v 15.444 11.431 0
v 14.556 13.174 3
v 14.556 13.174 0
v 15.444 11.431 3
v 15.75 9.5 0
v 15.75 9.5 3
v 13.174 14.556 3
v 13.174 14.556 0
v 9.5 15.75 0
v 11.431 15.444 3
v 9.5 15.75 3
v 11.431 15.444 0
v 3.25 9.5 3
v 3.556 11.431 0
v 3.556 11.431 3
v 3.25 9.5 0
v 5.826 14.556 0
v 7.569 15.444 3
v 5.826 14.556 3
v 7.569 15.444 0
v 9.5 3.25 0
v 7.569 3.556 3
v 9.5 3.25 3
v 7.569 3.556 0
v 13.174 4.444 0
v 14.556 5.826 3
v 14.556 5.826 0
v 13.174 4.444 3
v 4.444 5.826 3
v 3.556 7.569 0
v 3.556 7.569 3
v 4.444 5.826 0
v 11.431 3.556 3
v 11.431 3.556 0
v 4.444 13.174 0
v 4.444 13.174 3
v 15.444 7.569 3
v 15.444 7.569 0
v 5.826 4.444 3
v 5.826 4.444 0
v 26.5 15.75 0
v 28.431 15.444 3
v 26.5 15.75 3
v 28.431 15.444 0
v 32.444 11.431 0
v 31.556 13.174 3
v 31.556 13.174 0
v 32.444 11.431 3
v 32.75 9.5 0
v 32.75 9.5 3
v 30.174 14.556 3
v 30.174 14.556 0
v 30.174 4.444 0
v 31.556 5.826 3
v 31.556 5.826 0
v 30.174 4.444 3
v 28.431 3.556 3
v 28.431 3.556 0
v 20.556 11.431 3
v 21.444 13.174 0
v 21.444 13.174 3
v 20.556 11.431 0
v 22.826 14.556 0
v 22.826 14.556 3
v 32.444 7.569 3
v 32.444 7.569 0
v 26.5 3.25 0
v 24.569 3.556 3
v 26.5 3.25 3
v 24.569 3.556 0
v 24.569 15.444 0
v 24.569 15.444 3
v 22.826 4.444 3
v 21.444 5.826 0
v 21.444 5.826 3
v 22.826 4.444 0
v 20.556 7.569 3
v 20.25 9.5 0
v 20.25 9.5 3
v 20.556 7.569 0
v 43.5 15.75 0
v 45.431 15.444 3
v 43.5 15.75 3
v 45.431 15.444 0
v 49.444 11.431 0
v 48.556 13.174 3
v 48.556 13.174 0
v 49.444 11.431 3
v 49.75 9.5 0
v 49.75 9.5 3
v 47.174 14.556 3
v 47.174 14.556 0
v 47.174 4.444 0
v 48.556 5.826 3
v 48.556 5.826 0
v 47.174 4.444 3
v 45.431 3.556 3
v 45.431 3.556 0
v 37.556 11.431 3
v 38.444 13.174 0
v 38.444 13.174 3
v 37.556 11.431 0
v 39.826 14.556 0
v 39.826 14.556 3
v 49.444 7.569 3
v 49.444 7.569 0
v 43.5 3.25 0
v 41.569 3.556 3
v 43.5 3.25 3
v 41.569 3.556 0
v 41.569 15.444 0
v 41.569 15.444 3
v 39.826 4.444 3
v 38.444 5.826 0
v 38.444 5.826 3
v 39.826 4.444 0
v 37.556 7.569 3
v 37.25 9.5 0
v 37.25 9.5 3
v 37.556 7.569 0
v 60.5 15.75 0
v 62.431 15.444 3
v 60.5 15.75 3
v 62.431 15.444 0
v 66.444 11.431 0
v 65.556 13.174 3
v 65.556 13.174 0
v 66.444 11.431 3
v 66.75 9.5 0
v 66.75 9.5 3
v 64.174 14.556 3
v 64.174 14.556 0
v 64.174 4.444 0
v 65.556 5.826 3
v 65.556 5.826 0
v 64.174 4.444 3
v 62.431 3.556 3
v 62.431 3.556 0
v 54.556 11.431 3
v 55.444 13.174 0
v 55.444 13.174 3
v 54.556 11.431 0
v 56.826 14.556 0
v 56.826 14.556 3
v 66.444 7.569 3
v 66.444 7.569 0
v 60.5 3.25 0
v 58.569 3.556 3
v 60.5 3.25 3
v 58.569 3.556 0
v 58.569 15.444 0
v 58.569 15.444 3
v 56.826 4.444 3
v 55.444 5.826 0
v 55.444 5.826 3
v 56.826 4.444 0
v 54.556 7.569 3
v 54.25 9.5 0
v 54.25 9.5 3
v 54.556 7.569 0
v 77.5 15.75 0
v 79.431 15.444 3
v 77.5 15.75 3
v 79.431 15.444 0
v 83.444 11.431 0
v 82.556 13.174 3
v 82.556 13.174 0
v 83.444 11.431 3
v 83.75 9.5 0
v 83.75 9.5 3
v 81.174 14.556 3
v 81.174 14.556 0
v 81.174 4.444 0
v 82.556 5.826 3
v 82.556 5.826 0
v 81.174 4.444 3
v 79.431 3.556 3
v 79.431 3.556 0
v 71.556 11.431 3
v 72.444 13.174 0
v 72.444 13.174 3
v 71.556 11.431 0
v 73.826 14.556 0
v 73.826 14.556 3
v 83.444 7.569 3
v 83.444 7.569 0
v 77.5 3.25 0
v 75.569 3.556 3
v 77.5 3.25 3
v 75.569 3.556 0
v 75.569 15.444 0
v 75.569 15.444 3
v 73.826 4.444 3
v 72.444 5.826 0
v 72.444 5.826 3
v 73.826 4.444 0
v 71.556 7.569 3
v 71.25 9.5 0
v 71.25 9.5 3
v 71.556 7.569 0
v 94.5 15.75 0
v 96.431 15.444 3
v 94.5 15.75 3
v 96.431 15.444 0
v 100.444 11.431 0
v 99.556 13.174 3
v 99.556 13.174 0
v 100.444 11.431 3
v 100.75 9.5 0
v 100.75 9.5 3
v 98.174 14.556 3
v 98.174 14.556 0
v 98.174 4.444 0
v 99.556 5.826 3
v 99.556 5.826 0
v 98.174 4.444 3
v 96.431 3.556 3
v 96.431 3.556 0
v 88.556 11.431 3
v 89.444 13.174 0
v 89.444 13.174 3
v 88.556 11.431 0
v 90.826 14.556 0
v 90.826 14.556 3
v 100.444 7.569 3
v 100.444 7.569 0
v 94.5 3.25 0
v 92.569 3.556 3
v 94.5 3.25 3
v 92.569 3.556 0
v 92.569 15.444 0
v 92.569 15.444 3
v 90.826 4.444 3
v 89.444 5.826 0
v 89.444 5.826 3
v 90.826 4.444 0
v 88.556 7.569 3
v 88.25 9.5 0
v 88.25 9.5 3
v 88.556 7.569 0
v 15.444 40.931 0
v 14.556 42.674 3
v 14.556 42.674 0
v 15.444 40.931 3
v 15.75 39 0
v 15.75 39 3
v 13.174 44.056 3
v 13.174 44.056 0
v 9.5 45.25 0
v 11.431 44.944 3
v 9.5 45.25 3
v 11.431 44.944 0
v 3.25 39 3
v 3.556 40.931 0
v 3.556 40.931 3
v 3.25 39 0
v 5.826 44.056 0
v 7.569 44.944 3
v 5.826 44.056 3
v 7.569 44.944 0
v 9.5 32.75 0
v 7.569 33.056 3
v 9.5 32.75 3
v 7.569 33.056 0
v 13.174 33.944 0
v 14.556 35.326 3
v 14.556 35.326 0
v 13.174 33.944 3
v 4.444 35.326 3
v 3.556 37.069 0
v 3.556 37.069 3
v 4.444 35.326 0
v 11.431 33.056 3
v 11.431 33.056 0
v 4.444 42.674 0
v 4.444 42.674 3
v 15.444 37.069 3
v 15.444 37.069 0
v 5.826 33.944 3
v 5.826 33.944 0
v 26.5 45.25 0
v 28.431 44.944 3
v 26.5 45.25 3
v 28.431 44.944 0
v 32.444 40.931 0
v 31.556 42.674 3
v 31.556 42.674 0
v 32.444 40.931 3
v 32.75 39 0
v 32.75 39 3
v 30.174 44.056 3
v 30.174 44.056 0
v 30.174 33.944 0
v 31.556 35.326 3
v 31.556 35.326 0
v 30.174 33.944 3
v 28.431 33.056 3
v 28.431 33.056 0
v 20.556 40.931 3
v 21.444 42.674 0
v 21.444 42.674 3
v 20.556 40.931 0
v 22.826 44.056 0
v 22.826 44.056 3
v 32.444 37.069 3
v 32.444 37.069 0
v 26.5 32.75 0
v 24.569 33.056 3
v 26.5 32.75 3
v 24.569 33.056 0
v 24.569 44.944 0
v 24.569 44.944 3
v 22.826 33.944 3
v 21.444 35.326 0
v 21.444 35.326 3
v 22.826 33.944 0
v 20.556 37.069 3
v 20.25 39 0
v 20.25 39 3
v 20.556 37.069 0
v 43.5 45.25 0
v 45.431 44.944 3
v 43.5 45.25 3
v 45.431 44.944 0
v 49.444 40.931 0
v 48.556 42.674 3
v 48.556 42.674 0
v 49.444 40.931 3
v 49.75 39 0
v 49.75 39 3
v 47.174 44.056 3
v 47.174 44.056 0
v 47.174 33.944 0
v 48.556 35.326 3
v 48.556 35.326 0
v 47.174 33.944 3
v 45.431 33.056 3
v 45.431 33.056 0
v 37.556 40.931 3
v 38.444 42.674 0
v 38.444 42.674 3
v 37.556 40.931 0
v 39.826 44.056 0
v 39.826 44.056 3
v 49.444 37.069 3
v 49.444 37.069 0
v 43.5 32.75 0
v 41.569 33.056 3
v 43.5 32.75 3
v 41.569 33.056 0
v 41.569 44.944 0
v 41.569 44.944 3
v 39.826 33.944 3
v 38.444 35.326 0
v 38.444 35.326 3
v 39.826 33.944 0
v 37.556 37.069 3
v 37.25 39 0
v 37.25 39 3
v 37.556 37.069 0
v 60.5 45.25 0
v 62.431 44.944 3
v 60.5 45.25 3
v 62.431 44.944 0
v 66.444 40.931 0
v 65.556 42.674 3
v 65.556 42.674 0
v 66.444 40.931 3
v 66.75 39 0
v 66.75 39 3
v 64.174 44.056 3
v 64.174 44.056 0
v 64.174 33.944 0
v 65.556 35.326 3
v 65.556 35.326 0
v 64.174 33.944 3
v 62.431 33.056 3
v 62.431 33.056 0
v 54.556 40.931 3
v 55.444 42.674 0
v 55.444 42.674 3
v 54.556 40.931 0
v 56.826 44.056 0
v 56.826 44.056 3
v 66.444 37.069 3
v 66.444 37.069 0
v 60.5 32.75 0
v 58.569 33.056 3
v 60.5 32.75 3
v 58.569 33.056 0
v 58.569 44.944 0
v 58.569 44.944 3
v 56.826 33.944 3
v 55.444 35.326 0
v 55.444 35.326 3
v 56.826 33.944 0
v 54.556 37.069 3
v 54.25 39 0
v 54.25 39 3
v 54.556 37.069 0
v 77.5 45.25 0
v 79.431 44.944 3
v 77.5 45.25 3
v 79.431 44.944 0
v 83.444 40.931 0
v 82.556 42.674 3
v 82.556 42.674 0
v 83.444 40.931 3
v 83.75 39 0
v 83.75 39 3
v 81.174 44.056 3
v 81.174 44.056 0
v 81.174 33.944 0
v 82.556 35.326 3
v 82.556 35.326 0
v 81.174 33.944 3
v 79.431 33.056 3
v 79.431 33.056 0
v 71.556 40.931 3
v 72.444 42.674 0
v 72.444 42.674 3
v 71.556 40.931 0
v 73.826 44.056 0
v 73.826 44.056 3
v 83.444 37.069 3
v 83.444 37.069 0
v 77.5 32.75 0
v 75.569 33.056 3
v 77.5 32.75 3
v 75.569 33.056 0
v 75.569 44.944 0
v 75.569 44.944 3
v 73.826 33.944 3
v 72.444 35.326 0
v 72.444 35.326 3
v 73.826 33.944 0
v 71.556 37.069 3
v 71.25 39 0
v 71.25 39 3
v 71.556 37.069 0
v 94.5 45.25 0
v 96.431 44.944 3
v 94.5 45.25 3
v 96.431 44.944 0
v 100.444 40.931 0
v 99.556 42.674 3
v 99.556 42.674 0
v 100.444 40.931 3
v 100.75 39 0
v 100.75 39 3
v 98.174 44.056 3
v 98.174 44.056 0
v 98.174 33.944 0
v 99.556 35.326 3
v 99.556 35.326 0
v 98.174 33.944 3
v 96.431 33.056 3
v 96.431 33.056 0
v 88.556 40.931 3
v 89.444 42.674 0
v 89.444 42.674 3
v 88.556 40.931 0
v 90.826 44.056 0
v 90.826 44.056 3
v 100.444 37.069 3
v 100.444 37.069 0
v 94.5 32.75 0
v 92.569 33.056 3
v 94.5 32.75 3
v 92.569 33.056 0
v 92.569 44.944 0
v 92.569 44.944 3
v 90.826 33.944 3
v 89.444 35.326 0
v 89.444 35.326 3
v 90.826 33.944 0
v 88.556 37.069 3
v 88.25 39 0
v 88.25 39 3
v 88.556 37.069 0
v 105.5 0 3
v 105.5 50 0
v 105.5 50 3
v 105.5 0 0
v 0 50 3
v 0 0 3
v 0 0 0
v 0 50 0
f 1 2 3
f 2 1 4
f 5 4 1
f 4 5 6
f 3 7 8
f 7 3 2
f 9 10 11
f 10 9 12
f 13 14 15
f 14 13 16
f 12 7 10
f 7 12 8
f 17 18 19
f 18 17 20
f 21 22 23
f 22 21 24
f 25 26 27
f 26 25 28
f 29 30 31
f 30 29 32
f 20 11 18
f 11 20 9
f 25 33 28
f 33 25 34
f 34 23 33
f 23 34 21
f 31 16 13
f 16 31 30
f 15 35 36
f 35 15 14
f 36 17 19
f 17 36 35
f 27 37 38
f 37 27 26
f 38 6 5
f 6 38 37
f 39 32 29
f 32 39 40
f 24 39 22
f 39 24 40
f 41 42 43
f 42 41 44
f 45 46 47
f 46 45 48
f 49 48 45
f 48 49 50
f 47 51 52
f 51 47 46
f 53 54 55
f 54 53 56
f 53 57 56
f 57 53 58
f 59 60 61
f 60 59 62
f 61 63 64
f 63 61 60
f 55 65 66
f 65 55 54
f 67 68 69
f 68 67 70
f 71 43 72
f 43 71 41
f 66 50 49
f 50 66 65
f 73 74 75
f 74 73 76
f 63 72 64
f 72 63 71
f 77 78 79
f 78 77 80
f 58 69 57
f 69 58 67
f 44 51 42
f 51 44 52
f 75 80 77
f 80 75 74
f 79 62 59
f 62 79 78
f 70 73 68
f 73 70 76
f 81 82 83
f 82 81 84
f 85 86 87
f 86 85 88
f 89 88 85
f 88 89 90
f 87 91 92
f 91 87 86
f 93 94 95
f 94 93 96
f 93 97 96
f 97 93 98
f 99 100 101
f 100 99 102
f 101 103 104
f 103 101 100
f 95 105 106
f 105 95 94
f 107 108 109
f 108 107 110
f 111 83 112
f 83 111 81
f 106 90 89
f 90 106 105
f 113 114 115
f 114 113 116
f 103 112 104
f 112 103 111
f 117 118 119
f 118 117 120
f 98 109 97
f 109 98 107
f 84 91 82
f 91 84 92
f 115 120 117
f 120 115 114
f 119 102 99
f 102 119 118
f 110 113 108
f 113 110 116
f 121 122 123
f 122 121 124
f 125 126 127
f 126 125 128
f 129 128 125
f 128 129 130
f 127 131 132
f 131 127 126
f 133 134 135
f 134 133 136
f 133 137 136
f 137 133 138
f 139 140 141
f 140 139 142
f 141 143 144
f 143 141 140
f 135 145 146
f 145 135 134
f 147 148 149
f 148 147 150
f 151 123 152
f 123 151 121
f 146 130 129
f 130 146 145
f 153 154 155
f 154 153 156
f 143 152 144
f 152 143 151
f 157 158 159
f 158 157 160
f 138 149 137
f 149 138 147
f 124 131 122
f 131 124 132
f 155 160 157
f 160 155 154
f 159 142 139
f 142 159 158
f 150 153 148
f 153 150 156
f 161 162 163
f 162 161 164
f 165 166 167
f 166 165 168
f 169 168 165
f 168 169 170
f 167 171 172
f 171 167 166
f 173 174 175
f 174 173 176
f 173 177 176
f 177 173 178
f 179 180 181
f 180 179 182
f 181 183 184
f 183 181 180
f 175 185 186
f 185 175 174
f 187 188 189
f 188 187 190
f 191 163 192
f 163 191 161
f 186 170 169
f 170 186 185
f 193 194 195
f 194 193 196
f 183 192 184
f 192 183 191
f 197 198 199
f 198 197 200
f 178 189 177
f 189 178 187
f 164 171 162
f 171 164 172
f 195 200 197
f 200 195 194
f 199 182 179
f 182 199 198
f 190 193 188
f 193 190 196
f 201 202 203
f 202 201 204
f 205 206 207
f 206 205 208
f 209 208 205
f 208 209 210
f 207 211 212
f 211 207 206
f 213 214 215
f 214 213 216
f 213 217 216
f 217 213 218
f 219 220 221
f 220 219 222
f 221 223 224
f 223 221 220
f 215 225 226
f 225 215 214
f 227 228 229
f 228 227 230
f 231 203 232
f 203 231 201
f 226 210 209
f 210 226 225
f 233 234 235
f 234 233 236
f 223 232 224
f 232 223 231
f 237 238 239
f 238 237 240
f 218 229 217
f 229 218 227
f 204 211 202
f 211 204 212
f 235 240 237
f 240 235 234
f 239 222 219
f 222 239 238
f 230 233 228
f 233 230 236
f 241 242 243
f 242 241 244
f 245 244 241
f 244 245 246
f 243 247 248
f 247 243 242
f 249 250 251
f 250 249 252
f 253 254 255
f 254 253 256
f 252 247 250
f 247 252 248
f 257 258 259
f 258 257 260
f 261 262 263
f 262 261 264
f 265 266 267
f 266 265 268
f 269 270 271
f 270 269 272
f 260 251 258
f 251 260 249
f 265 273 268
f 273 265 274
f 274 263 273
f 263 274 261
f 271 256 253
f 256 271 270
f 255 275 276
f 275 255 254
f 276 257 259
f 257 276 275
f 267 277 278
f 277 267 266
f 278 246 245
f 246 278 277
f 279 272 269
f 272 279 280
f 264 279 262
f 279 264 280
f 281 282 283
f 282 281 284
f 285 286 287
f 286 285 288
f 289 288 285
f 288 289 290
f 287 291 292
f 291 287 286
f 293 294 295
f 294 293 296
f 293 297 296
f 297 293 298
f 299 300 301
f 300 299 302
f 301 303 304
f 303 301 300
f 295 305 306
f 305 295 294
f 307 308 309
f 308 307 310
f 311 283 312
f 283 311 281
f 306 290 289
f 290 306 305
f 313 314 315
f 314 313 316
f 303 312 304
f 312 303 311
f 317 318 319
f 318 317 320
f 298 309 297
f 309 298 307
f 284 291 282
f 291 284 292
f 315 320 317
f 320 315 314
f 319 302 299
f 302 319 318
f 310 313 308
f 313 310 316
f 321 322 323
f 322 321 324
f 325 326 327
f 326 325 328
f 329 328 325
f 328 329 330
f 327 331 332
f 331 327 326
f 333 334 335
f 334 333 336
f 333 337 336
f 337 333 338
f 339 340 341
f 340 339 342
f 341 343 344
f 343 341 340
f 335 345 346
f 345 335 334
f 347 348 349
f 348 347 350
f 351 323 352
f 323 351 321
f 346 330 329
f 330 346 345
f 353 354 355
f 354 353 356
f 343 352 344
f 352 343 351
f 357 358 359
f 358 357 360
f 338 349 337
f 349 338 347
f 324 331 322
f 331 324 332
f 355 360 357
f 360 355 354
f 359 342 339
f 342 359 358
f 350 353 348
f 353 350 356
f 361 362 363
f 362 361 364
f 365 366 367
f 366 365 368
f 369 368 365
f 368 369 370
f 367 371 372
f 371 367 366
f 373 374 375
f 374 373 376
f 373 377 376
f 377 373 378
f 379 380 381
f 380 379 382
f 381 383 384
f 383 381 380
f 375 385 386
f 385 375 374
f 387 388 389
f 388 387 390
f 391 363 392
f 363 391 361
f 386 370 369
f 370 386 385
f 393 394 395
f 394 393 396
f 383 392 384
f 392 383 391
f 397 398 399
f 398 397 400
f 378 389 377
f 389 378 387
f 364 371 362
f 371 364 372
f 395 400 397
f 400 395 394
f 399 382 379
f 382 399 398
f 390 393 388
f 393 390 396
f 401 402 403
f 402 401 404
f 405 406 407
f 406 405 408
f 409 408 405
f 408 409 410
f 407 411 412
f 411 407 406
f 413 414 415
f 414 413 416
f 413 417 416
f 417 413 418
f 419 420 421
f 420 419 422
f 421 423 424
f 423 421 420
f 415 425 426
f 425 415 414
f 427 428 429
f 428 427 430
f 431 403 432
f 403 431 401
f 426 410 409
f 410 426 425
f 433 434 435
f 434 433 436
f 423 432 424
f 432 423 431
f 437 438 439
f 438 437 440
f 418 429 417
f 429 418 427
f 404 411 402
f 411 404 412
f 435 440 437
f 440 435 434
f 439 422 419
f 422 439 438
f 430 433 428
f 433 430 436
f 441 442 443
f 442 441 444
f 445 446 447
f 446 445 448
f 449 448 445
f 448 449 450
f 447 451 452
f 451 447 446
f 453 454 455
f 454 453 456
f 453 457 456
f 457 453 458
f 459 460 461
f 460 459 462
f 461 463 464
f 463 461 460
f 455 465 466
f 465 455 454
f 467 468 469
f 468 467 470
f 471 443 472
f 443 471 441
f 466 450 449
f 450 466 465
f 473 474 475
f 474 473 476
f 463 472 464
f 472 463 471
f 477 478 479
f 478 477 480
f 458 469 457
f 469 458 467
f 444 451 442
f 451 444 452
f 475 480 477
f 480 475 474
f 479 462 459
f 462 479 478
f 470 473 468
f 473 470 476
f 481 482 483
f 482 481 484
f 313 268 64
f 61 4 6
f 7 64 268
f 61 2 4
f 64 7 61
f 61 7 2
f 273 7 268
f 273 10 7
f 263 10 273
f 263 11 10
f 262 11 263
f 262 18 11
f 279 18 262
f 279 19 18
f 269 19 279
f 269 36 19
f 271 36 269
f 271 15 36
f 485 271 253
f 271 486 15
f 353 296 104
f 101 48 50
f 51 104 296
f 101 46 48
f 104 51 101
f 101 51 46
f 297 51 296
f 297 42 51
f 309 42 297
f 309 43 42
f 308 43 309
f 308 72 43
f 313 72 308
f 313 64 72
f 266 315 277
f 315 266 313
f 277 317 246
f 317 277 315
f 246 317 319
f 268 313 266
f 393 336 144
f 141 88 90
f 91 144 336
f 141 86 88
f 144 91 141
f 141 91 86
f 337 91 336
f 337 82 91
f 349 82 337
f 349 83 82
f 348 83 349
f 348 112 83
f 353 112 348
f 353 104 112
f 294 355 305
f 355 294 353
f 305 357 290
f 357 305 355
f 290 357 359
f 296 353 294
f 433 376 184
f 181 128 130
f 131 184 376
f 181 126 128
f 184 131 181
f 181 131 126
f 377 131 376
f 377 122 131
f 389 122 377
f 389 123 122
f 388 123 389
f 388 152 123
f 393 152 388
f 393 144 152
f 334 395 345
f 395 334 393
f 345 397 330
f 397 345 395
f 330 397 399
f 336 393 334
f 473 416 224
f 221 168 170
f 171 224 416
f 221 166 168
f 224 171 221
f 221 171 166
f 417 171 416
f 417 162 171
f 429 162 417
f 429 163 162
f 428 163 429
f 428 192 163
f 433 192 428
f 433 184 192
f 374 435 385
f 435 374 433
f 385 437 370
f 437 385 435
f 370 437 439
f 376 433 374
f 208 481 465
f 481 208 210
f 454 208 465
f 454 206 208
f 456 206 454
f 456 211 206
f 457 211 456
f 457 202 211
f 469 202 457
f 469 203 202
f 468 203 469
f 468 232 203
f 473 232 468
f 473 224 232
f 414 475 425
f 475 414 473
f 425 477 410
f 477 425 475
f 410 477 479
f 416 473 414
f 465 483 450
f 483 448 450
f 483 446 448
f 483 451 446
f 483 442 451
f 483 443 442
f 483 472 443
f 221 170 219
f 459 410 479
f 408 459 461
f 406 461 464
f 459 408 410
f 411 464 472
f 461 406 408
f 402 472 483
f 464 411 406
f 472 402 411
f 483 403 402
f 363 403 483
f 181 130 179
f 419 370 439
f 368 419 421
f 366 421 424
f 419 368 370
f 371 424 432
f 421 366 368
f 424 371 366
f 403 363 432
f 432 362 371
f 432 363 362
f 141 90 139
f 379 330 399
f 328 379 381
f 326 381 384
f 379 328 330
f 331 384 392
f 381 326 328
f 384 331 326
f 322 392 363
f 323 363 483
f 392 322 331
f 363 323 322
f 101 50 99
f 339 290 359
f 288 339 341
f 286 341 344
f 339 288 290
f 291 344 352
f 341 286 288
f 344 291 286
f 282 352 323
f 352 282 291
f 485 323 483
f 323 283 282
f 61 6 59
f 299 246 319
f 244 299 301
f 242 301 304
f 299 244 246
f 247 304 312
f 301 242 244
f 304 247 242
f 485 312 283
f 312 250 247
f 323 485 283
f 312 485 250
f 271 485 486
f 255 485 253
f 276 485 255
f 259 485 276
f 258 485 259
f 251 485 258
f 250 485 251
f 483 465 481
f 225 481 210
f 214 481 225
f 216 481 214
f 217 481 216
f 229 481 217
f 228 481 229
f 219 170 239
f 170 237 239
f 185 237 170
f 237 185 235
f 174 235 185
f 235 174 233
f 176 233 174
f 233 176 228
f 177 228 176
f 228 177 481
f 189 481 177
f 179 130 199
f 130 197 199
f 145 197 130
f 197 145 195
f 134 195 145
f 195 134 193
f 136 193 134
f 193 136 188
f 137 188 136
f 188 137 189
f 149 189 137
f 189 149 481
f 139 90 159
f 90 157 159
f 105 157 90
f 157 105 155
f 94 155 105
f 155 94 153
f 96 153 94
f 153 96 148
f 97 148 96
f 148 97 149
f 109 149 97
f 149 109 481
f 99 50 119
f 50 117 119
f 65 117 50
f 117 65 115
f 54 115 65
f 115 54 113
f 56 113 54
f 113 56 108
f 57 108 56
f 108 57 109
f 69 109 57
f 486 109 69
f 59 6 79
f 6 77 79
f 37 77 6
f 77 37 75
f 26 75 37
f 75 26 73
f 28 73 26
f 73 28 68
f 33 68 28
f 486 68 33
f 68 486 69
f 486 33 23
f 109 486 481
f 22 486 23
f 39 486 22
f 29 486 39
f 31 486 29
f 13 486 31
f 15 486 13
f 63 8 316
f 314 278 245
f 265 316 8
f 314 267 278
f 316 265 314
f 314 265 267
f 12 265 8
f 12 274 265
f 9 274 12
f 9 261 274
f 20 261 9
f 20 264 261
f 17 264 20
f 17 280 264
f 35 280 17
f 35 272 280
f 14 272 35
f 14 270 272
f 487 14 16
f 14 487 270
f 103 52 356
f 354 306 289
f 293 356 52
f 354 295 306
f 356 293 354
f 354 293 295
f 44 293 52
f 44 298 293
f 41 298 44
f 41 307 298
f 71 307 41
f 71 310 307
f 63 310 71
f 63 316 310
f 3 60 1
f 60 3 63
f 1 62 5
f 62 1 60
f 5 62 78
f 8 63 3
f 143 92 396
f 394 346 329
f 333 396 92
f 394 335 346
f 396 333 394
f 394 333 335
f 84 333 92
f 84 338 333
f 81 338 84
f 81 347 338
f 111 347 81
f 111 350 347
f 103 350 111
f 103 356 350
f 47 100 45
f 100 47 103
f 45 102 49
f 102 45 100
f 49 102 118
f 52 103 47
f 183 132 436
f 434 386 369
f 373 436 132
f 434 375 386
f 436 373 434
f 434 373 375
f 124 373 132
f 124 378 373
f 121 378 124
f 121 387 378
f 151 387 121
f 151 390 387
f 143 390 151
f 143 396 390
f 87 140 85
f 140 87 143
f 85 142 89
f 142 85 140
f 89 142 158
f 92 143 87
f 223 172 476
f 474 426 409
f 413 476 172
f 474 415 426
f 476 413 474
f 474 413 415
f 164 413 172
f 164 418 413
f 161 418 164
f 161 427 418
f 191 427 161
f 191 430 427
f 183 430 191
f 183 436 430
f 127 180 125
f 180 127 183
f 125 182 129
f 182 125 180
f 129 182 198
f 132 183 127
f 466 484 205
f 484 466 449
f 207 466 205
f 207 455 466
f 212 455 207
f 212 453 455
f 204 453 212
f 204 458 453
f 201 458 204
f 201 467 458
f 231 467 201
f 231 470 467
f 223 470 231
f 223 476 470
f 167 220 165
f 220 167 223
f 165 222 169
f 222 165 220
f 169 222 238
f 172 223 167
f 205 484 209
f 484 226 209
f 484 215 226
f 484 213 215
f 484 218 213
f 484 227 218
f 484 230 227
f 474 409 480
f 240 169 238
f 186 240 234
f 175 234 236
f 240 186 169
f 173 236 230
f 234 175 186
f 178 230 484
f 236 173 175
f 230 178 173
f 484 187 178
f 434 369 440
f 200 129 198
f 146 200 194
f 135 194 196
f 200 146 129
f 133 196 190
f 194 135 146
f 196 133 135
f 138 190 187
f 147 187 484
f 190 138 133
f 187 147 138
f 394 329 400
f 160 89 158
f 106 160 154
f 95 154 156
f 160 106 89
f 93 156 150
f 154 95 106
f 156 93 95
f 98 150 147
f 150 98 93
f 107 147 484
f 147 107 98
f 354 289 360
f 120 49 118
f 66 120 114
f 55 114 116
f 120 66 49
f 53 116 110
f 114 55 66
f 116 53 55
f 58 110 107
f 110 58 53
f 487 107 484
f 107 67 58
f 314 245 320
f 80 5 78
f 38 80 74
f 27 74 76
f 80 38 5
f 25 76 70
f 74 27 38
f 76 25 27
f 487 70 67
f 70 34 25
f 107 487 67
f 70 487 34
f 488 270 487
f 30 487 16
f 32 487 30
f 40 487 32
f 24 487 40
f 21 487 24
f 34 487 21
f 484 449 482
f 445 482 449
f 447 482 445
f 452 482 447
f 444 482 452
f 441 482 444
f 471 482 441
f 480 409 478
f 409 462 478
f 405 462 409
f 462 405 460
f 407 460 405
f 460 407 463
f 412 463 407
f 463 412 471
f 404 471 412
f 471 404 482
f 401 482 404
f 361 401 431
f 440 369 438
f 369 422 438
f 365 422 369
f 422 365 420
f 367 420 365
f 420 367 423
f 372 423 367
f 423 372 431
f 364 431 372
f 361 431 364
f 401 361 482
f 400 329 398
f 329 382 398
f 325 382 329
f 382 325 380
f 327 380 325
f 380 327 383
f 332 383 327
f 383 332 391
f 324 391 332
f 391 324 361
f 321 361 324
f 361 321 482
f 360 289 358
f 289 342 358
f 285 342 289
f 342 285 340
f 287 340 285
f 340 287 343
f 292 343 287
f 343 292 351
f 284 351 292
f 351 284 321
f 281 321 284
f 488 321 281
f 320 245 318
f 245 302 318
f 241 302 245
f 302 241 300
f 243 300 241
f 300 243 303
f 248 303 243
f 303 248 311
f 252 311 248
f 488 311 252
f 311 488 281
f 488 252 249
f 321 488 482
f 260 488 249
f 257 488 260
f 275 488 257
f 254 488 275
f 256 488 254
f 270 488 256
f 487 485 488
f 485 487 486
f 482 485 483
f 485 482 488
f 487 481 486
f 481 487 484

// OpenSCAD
// Create the top case for a grid of pressable buttons
module button_hole_grid(buttons = 12,         // how many buttons?
                        rows = 2,            // number of rows the buttons should be arranged in.
                        button_radius = 5.5, // Exact radius of pressable part of buttons.
                        button_spacing = 17, // centre-to-centre distance of buttons.
                        edge_margin = 4,     // how much space around the edge of the buttons?
                        thickness = 3) {     // how thick should the case be?
    nudge = 0.75; // to ensure buttons fit in holes
    hole_radius = button_radius + nudge;
    epsilon = 0.001; // to ensure CSG subtraction works ok

    hole_diameter = 2 * hole_radius;
    button_count_per_row = buttons / rows;
    space_count = button_count_per_row - 1;

    row_space_count = rows - 1;
    row_width = hole_diameter + button_spacing;
    case_width = (rows * hole_diameter) + (row_space_count * button_spacing) + (2 * edge_margin);
    case_length = (space_count * button_spacing)
                + hole_diameter
                + (2 * edge_margin);

    difference() {
        cube([case_length, case_width, thickness]);
        // Move to first button hole position
        translate([(edge_margin + button_radius), edge_margin + button_radius, -epsilon]) {
            for(row = [0:1:rows-1]) {
                // Calculate row position
                translate([0, (row * row_width), 0]) {
                    for(button = [0:1:button_count_per_row-1]) {
                        // Calculate button position
                        translate([(button_spacing * button), 0, 0]) {
                            cylinder(h = 3 * thickness, r = hole_radius, center = true);
                        }
                    }
                }
            }
        }
    }
}

button_hole_grid();
